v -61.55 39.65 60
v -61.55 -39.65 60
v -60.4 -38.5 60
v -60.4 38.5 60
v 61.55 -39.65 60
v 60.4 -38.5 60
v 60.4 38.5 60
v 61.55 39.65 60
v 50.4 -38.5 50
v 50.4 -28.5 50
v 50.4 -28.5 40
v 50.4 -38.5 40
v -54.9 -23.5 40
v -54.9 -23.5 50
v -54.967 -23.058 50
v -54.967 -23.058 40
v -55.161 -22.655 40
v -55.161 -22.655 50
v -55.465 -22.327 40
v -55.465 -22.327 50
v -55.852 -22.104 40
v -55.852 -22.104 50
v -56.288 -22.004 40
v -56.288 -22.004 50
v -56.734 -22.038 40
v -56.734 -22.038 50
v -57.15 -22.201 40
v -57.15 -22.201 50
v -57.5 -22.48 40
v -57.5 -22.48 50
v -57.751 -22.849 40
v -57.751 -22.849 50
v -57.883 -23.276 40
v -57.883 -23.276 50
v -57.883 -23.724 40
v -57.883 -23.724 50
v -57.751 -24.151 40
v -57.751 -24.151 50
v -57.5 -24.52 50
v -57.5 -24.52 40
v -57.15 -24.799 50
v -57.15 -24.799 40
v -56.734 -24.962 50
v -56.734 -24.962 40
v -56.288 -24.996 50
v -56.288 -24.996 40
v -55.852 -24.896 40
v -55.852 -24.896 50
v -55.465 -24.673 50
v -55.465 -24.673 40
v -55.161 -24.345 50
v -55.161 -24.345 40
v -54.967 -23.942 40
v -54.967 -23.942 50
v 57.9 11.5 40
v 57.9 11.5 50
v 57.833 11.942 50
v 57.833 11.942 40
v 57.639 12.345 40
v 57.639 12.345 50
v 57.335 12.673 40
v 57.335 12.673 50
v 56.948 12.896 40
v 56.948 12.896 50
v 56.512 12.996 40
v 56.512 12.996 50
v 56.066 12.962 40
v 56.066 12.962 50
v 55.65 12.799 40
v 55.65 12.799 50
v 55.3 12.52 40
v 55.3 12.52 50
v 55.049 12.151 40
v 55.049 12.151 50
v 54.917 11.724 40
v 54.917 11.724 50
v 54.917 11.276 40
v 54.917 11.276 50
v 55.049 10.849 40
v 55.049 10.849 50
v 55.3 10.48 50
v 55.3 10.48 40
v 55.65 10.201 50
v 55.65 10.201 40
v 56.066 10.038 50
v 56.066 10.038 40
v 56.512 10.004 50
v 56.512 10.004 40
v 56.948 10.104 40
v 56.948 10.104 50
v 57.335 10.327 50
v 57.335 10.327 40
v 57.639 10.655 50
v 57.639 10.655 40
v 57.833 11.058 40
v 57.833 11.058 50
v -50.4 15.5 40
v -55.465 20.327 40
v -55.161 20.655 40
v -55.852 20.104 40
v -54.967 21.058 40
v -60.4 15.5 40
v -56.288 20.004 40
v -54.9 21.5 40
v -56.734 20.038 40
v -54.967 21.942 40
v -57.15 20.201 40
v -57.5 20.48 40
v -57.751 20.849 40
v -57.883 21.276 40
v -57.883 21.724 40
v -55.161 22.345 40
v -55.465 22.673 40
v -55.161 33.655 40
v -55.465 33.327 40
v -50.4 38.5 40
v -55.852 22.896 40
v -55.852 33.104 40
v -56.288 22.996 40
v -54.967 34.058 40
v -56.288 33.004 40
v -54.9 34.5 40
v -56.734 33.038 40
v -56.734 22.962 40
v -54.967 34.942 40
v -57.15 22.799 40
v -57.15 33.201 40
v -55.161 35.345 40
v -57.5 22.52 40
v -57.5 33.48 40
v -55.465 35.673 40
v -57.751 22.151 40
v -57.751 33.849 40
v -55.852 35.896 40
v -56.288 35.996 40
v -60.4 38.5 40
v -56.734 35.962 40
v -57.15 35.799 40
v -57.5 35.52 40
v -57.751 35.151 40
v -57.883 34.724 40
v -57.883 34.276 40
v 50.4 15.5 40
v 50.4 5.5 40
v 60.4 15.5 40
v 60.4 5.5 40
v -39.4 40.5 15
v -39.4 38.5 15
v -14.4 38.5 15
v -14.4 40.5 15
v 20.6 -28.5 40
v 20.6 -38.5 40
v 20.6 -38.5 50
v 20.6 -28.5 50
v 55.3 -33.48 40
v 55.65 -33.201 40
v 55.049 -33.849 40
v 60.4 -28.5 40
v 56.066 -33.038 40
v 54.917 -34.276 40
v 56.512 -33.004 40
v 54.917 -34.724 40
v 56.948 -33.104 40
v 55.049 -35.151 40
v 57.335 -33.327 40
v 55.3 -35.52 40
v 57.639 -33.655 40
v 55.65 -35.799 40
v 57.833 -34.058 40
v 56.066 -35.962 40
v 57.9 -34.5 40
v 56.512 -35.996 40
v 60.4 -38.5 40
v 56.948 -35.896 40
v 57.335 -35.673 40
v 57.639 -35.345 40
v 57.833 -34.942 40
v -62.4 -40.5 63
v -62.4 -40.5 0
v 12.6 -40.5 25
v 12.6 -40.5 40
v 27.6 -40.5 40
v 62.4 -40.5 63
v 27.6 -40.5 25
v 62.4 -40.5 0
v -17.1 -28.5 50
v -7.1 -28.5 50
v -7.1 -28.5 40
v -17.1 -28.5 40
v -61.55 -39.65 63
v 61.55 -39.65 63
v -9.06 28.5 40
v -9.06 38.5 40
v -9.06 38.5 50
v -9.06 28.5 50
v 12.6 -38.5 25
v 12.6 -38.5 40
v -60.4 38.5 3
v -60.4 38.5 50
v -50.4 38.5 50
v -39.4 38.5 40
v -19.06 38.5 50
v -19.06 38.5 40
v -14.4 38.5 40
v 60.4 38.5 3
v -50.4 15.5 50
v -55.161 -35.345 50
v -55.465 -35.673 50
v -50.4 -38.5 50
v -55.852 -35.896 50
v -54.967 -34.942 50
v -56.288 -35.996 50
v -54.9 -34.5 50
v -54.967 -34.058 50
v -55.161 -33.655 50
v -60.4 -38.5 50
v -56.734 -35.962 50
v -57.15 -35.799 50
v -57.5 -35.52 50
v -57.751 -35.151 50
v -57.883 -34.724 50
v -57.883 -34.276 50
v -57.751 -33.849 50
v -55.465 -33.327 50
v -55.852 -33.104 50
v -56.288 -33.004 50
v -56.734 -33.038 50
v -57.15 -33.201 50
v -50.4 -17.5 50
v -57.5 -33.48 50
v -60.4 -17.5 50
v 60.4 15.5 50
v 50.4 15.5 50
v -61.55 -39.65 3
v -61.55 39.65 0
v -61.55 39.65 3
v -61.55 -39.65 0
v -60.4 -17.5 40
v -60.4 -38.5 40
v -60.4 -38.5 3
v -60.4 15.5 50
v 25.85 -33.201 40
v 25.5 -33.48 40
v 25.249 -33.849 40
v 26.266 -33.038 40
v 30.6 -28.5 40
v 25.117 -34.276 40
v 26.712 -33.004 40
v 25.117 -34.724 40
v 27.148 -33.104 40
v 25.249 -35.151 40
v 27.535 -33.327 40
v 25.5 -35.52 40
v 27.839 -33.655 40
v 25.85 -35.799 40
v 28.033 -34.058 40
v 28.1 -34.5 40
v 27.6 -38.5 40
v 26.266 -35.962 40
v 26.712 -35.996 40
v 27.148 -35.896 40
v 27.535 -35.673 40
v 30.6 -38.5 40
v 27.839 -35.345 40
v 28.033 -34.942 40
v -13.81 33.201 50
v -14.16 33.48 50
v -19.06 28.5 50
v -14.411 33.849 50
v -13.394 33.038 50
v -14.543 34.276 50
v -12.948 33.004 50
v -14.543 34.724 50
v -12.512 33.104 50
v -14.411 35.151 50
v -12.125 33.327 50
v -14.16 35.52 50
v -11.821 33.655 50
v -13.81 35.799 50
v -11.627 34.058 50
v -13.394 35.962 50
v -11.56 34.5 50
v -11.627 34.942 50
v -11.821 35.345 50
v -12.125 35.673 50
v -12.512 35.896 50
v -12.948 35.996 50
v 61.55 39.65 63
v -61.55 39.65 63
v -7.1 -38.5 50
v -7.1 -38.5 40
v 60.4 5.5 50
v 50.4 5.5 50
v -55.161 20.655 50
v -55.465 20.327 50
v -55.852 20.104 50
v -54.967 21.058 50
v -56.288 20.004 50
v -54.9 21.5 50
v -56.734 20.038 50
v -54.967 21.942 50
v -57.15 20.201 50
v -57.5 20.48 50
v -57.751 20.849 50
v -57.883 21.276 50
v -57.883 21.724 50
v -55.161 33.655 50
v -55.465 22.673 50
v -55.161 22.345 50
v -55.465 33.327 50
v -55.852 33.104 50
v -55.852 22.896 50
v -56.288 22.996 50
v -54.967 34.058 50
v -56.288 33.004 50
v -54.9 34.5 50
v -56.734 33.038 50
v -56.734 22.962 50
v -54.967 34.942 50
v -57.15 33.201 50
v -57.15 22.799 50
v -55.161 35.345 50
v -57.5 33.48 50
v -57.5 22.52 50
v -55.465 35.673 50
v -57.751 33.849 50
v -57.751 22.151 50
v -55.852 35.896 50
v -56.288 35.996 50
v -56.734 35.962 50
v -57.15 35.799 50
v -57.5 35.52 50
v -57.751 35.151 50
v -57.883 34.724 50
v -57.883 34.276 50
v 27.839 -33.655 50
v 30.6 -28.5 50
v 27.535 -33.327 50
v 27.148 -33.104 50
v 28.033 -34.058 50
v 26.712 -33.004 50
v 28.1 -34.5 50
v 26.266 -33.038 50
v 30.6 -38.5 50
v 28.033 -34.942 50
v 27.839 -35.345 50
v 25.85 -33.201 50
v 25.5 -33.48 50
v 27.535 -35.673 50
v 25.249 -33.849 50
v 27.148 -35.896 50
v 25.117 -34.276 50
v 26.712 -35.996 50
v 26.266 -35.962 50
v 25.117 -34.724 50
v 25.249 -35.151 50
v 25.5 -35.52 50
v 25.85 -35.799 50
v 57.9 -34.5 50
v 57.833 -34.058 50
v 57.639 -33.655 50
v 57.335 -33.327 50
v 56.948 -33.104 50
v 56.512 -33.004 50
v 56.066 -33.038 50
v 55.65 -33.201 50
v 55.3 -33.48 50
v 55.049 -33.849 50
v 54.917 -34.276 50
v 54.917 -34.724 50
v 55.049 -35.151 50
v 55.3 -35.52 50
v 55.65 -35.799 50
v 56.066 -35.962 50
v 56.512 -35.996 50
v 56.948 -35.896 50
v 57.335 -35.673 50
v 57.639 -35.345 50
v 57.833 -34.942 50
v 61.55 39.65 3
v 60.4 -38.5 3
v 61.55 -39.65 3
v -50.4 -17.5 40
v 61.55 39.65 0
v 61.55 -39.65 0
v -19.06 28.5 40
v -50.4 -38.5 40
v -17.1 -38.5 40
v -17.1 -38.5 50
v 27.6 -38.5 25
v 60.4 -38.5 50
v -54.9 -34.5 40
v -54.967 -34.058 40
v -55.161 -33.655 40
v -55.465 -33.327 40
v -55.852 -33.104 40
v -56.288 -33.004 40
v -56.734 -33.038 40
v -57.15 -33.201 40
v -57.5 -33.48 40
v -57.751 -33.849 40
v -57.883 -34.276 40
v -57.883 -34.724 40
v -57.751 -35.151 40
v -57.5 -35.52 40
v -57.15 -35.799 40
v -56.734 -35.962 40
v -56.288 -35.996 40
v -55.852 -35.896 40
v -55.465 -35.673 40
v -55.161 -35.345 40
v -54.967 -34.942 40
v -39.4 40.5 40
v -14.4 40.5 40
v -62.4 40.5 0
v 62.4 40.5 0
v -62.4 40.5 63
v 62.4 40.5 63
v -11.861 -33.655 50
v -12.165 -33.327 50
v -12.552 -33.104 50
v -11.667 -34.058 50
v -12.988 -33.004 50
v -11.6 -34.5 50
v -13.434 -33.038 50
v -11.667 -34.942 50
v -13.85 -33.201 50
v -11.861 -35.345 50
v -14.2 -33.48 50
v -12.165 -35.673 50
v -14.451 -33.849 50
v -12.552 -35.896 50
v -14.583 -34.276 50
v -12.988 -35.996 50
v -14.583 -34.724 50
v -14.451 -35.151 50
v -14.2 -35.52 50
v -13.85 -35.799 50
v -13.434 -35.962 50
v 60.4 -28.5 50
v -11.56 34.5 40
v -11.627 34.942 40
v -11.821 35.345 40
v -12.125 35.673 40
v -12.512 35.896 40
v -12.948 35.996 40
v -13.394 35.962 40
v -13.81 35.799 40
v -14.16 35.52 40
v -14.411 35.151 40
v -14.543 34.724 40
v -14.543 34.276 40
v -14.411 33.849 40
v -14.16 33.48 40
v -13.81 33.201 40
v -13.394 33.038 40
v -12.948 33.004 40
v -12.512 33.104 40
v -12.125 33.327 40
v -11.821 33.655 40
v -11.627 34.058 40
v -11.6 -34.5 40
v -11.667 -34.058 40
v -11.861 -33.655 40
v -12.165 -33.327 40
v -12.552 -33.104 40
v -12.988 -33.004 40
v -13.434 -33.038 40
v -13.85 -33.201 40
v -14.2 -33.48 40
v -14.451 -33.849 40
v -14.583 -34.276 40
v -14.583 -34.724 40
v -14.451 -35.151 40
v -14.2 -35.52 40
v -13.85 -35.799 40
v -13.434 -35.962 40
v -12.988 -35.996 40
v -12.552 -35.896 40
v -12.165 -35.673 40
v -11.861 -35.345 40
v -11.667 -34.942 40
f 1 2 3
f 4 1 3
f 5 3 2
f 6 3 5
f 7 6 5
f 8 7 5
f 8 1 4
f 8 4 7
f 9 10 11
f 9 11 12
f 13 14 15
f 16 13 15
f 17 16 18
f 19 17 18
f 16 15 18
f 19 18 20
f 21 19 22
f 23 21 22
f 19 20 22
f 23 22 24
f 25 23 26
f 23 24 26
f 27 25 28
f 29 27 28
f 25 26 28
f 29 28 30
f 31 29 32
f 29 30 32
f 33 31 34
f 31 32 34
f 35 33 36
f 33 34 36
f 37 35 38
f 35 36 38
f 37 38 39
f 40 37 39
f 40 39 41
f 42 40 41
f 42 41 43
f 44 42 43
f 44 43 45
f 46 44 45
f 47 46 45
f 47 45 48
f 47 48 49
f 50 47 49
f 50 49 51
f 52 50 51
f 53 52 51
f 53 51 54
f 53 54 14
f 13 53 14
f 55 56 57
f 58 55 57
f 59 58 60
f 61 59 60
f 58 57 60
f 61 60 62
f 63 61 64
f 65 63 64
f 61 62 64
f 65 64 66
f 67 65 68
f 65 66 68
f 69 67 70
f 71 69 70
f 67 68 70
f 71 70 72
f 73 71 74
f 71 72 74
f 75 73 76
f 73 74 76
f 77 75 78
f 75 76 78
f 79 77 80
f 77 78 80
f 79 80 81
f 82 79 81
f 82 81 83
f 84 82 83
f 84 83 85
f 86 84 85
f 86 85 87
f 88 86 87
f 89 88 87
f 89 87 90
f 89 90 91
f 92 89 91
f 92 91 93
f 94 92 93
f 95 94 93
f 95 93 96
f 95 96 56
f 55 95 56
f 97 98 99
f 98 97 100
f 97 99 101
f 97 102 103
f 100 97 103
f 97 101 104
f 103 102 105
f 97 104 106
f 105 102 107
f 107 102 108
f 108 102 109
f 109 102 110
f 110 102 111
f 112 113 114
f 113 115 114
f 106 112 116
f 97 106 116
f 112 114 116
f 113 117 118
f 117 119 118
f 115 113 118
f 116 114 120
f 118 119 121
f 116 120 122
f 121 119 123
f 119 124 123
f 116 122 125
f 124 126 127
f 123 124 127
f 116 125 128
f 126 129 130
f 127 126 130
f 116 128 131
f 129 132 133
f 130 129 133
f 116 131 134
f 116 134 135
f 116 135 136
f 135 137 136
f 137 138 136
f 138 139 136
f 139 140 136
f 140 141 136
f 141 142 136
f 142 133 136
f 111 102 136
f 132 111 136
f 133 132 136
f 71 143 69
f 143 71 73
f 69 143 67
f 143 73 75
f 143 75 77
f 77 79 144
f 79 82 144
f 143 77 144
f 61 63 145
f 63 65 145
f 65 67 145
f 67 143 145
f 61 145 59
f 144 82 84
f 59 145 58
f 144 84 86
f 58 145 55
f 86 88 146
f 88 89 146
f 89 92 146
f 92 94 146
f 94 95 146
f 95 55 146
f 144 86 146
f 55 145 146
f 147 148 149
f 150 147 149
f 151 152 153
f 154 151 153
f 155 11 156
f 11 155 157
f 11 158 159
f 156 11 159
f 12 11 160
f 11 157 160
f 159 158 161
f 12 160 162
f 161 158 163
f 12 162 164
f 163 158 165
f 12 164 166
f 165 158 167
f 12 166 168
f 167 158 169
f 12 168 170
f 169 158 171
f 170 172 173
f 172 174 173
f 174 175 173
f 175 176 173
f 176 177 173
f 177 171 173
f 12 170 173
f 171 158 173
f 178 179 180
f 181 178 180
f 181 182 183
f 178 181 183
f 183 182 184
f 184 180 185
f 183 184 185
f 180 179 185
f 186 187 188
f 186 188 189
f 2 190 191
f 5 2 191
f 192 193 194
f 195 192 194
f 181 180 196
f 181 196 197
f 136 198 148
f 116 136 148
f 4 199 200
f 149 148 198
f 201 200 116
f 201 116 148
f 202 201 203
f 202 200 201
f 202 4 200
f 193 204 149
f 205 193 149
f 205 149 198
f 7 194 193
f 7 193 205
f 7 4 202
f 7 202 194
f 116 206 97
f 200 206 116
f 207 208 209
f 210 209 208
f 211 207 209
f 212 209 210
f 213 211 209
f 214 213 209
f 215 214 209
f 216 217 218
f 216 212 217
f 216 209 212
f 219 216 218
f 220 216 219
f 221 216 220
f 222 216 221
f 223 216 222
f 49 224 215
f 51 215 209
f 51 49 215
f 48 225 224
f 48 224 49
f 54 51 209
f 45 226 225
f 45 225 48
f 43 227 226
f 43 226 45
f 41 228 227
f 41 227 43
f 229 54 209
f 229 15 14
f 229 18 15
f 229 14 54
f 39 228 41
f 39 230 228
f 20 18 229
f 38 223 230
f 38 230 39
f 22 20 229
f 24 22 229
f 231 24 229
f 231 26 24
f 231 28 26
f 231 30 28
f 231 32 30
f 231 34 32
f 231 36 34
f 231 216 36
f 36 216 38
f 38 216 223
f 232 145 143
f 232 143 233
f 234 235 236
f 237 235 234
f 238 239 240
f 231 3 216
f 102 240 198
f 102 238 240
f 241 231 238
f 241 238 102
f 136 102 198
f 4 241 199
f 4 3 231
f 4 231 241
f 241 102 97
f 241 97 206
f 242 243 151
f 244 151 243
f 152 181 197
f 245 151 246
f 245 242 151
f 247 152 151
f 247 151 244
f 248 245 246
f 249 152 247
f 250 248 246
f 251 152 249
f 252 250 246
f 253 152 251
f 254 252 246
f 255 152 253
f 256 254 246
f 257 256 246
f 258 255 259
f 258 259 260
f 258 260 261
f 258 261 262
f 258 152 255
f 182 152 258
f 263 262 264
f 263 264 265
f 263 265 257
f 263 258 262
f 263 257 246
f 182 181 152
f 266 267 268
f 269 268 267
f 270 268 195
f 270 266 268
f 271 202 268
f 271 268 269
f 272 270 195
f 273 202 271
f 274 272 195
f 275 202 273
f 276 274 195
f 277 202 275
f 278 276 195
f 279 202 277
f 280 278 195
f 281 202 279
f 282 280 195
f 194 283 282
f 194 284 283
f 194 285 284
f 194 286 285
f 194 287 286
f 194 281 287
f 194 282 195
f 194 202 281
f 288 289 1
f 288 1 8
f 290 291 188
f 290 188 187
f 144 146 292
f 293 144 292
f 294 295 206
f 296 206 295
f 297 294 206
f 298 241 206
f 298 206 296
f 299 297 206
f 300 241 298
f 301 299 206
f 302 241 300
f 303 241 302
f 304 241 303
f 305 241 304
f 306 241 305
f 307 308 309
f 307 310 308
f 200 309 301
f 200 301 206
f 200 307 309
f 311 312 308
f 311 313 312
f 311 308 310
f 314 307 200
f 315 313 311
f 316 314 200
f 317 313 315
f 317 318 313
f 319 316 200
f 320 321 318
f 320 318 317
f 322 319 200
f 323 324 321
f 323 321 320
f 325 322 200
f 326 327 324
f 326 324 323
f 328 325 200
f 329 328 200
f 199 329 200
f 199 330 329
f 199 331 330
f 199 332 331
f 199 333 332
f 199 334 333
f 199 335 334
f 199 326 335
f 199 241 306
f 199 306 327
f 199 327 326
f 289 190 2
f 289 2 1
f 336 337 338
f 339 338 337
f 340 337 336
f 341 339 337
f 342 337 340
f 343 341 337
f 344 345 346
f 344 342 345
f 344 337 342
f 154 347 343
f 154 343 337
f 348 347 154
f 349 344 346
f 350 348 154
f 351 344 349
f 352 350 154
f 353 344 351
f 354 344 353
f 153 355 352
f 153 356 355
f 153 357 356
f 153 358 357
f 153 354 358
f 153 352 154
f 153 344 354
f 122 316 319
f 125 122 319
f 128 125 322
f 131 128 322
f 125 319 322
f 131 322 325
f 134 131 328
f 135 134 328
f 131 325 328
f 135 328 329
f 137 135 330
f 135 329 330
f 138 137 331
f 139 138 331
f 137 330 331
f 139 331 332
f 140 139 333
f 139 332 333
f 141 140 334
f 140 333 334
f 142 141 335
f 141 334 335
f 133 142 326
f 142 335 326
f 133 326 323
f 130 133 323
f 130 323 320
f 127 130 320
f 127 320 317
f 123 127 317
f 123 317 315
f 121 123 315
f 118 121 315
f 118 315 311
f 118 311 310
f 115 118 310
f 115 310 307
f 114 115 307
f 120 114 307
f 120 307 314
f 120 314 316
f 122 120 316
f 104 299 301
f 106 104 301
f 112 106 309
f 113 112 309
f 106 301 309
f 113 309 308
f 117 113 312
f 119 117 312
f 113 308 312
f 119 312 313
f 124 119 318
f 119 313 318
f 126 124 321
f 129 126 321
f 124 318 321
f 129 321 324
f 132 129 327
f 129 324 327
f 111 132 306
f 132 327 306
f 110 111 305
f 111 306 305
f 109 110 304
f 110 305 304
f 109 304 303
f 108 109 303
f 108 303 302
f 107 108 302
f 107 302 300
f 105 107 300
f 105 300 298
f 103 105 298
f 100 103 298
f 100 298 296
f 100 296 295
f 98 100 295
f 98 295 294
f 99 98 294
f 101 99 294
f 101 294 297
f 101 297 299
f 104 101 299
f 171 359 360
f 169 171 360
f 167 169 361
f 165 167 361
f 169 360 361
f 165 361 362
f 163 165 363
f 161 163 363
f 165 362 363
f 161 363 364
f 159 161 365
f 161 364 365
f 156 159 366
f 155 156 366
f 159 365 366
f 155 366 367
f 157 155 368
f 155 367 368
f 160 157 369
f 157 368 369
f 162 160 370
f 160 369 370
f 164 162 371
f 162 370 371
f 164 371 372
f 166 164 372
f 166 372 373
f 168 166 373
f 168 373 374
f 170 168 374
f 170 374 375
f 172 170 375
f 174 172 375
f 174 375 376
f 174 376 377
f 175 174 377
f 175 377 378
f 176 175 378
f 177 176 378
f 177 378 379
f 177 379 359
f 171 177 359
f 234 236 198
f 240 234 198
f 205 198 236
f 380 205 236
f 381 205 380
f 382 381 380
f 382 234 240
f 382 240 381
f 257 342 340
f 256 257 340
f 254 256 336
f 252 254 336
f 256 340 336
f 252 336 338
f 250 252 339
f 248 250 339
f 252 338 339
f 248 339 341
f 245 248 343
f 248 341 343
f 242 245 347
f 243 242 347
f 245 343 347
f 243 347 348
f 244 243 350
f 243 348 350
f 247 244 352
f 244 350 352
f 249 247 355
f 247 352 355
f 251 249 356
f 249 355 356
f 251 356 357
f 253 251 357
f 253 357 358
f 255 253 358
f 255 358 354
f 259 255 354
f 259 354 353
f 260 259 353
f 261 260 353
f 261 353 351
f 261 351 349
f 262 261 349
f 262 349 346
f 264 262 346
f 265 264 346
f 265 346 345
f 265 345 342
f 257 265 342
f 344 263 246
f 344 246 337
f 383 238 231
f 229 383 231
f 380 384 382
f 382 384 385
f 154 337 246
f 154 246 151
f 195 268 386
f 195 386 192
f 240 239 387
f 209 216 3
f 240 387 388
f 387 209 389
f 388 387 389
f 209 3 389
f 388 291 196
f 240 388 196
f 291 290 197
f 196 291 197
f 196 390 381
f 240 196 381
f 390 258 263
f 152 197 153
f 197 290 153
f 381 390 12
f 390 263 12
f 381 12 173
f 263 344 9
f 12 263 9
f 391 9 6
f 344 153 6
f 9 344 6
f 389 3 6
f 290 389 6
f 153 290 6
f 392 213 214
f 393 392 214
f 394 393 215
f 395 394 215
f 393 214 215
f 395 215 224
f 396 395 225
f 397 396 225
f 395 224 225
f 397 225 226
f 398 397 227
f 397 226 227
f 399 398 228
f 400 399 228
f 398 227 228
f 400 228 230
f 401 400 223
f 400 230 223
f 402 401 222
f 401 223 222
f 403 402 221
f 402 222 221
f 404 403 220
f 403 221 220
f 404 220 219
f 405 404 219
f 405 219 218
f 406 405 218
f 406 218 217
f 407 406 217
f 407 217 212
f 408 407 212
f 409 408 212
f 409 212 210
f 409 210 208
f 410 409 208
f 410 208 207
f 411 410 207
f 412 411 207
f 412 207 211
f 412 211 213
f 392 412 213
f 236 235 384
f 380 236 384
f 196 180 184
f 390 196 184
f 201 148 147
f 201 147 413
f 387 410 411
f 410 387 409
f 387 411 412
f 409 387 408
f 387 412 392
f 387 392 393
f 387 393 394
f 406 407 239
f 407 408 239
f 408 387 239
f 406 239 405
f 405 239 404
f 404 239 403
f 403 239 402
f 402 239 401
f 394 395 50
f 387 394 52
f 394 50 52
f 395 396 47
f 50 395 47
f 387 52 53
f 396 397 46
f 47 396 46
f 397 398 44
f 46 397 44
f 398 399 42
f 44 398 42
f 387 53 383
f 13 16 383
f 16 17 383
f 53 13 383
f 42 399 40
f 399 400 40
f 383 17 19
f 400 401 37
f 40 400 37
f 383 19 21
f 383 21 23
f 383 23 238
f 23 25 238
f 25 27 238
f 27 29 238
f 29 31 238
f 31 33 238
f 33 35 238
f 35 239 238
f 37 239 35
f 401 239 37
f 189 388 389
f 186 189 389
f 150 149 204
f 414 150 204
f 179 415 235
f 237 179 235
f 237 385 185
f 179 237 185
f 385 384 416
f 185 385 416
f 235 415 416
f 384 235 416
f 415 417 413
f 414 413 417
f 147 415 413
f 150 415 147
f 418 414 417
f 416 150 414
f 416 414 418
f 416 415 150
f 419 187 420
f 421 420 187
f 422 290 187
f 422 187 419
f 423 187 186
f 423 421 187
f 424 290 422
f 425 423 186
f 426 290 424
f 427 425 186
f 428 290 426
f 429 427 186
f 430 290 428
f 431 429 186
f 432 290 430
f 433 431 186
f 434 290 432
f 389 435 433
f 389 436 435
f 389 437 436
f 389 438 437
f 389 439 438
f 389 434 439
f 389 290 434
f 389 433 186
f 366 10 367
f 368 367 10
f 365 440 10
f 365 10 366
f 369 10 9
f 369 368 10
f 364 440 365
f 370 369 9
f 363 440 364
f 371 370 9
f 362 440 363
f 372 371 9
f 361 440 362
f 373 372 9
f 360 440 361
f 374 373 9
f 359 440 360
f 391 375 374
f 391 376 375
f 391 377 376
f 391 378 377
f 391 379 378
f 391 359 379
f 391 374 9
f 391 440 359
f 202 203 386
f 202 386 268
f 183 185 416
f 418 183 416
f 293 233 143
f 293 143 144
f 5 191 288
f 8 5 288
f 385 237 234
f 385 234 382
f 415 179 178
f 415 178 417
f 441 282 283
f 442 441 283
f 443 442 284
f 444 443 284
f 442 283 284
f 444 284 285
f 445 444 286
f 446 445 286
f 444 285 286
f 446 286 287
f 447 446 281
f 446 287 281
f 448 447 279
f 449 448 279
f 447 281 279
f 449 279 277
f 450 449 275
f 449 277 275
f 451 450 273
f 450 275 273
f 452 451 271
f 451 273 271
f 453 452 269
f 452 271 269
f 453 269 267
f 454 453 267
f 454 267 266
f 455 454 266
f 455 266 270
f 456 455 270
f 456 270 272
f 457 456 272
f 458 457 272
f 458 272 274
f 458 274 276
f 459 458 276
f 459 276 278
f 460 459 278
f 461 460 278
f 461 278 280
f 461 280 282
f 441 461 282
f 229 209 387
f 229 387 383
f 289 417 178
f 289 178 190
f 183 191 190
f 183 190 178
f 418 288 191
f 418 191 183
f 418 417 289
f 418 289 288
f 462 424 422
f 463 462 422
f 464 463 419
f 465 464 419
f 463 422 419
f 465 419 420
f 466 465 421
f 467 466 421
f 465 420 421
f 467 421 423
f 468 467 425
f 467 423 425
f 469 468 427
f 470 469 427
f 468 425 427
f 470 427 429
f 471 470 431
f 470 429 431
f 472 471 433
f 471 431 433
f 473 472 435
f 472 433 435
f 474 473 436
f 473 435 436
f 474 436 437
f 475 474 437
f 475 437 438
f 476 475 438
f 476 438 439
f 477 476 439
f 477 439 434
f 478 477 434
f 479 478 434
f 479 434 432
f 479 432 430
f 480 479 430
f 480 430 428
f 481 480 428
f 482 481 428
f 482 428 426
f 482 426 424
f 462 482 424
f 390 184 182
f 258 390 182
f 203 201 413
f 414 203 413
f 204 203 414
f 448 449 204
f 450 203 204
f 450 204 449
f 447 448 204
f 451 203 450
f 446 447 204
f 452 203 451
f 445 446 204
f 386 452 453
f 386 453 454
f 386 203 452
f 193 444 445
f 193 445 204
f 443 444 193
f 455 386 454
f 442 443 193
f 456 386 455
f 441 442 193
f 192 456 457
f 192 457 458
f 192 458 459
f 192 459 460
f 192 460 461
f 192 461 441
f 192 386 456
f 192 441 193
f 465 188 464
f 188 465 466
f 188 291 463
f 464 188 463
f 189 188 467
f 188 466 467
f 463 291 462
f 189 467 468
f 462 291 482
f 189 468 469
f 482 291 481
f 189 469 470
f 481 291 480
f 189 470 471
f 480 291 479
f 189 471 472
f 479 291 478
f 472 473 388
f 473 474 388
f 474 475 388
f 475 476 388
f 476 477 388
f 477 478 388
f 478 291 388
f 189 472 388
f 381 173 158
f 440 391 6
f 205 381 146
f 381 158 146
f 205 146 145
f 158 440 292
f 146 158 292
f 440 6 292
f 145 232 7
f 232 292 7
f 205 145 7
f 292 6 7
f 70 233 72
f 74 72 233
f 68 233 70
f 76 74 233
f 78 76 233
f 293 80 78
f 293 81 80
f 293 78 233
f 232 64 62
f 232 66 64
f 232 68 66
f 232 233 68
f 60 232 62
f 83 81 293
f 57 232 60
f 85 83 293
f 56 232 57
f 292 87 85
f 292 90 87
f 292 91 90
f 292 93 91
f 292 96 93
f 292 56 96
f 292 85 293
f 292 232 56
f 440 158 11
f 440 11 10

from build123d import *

# Parameters (mm, degrees)
F0_W      = 124.8
F0_H      = 81
F1_DEPTH  = 63
F2_W      = 123.1
F2_H      = 79.3
F3_DEPTH  = 3
F4_W      = 123.1
F4_H      = 79.3
F5_DEPTH  = 3
F6_W      = 120.8
F6_H      = 77
F7_DEPTH  = 60.001
F8_W      = 21
F8_H      = 10
F9_DEPTH  = 10
F10_W     = 23
F10_H     = 10
F11_DEPTH = 10
F12_W     = 10
F12_H     = 10
F13_DEPTH = 10
F14_W     = 10
F14_H     = 10
F15_DEPTH = 10
F16_W     = 10
F16_H     = 10
F17_DEPTH = 10
F18_W     = 10
F18_H     = 10
F19_DEPTH = 10
F20_W     = 10
F20_H     = 10
F21_DEPTH = 10
F22_R     = 1.5
F23_DEPTH = 50.001
F24_R     = 1.5
F25_DEPTH = 50.001
F26_R     = 1.5
F27_DEPTH = 50.001
F28_R     = 1.5
F29_DEPTH = 50.001
F30_R     = 1.5
F31_DEPTH = 50.001
F32_R     = 1.5
F33_DEPTH = 50.001
F34_R     = 1.5
F35_DEPTH = 50.001
F36_R     = 1.5
F37_DEPTH = 50.001
F38_R     = 1.5
F39_DEPTH = 50.001
F40_W     = 25
F40_H     = 25
F41_DEPTH = 2.001
F42_W     = 15
F42_H     = 15
F43_DEPTH = 12


with BuildPart() as f1:
    # F0 (on Top) → F1 (new body)
    with BuildSketch(Plane.XY):
        Rectangle(F0_W, F0_H)
    extrude(amount=F1_DEPTH)

    # F2 (on face) → F3 (cut)
    with BuildSketch(Plane(origin=(0, 0, 0), x_dir=(1, 0, 0), z_dir=(0, 0, -1))):
        Rectangle(F2_W, F2_H)
    extrude(amount=-F3_DEPTH, mode=Mode.SUBTRACT)

    # F4 (on face) → F5 (cut)
    with BuildSketch(Plane.XY.offset(63)):
        Rectangle(F4_W, F4_H)
    extrude(amount=-F5_DEPTH, mode=Mode.SUBTRACT)

    # F6 (on face) → F7 (cut, through all)
    with BuildSketch(Plane.XY.offset(60)):
        Rectangle(F6_W, F6_H)
    extrude(amount=-F7_DEPTH, mode=Mode.SUBTRACT)

    # F8 (on face) → F9 (join)
    with BuildSketch(Plane.YZ.offset(-60.4)):
        with Locations((-28, 45)):
            Rectangle(F8_W, F8_H)
    extrude(amount=F9_DEPTH)

    # F10 (on face) → F11 (join)
    with BuildSketch(Plane.YZ.offset(-60.4)):
        with Locations((27, 45)):
            Rectangle(F10_W, F10_H)
    extrude(amount=F11_DEPTH)

    # F12 (on face) → F13 (join)
    with BuildSketch(Plane(origin=(60.4, 0, 0), x_dir=(0, -1, 0), z_dir=(-1, 0, 0))):
        with Locations((33.5, 45)):
            Rectangle(F12_W, F12_H)
    extrude(amount=F13_DEPTH)

    # F14 (on face) → F15 (join)
    with BuildSketch(Plane(origin=(60.4, 0, 0), x_dir=(0, -1, 0), z_dir=(-1, 0, 0))):
        with Locations((-10.5, 45)):
            Rectangle(F14_W, F14_H)
    extrude(amount=F15_DEPTH)

    # F16 (on face) → F17 (join)
    with BuildSketch(Plane(origin=(0, -38.5, 0), x_dir=(-1, 0, 0), z_dir=(0, 1, 0))):
        with Locations((-25.6, 45)):
            Rectangle(F16_W, F16_H)
    extrude(amount=F17_DEPTH)

    # F18 (on face) → F19 (join)
    with BuildSketch(Plane(origin=(0, -38.5, 0), x_dir=(-1, 0, 0), z_dir=(0, 1, 0))):
        with Locations((12.1, 45)):
            Rectangle(F18_W, F18_H)
    extrude(amount=F19_DEPTH)

    # F20 (on face) → F21 (join)
    with BuildSketch(Plane.XZ.offset(-38.5)):
        with Locations((-14.06, 45)):
            Rectangle(F20_W, F20_H)
    extrude(amount=F21_DEPTH)

    # F22 (on face) → F23 (cut, through all)
    with BuildSketch(Plane.XY.offset(50)):
        with Locations((-56.4, -34.5)):
            Circle(F22_R)
    extrude(amount=-F23_DEPTH, mode=Mode.SUBTRACT)

    # F24 (on face) → F25 (cut, through all)
    with BuildSketch(Plane.XY.offset(50)):
        with Locations((-56.4, -23.5)):
            Circle(F24_R)
    extrude(amount=-F25_DEPTH, mode=Mode.SUBTRACT)

    # F26 (on face) → F27 (cut, through all)
    with BuildSketch(Plane.XY.offset(50)):
        with Locations((-56.4, 34.5)):
            Circle(F26_R)
    extrude(amount=-F27_DEPTH, mode=Mode.SUBTRACT)

    # F28 (on face) → F29 (cut, through all)
    with BuildSketch(Plane.XY.offset(50)):
        with Locations((-56.4, 21.5)):
            Circle(F28_R)
    extrude(amount=-F29_DEPTH, mode=Mode.SUBTRACT)

    # F30 (on face) → F31 (cut, through all)
    with BuildSketch(Plane.XY.offset(50)):
        with Locations((56.4, -34.5)):
            Circle(F30_R)
    extrude(amount=-F31_DEPTH, mode=Mode.SUBTRACT)

    # F32 (on face) → F33 (cut, through all)
    with BuildSketch(Plane.XY.offset(50)):
        with Locations((56.4, 11.5)):
            Circle(F32_R)
    extrude(amount=-F33_DEPTH, mode=Mode.SUBTRACT)

    # F34 (on face) → F35 (cut, through all)
    with BuildSketch(Plane.XY.offset(50)):
        with Locations((26.6, -34.5)):
            Circle(F34_R)
    extrude(amount=-F35_DEPTH, mode=Mode.SUBTRACT)

    # F36 (on face) → F37 (cut, through all)
    with BuildSketch(Plane.XY.offset(50)):
        with Locations((-13.1, -34.5)):
            Circle(F36_R)
    extrude(amount=-F37_DEPTH, mode=Mode.SUBTRACT)

    # F38 (on face) → F39 (cut, through all)
    with BuildSketch(Plane.XY.offset(50)):
        with Locations((-13.06, 34.5)):
            Circle(F38_R)
    extrude(amount=-F39_DEPTH, mode=Mode.SUBTRACT)

    # F40 (on face) → F41 (cut, through all)
    with BuildSketch(Plane.XZ.offset(-38.5)):
        with Locations((-26.9, 27.5)):
            Rectangle(F40_W, F40_H)
    extrude(amount=-F41_DEPTH, mode=Mode.SUBTRACT)

    # F42 (on face) → F43 (cut)
    with BuildSketch(Plane.XZ.offset(40.5)):
        with Locations((20.1, 32.5)):
            Rectangle(F42_W, F42_H)
    extrude(amount=-F43_DEPTH, mode=Mode.SUBTRACT)


solid = f1.part
